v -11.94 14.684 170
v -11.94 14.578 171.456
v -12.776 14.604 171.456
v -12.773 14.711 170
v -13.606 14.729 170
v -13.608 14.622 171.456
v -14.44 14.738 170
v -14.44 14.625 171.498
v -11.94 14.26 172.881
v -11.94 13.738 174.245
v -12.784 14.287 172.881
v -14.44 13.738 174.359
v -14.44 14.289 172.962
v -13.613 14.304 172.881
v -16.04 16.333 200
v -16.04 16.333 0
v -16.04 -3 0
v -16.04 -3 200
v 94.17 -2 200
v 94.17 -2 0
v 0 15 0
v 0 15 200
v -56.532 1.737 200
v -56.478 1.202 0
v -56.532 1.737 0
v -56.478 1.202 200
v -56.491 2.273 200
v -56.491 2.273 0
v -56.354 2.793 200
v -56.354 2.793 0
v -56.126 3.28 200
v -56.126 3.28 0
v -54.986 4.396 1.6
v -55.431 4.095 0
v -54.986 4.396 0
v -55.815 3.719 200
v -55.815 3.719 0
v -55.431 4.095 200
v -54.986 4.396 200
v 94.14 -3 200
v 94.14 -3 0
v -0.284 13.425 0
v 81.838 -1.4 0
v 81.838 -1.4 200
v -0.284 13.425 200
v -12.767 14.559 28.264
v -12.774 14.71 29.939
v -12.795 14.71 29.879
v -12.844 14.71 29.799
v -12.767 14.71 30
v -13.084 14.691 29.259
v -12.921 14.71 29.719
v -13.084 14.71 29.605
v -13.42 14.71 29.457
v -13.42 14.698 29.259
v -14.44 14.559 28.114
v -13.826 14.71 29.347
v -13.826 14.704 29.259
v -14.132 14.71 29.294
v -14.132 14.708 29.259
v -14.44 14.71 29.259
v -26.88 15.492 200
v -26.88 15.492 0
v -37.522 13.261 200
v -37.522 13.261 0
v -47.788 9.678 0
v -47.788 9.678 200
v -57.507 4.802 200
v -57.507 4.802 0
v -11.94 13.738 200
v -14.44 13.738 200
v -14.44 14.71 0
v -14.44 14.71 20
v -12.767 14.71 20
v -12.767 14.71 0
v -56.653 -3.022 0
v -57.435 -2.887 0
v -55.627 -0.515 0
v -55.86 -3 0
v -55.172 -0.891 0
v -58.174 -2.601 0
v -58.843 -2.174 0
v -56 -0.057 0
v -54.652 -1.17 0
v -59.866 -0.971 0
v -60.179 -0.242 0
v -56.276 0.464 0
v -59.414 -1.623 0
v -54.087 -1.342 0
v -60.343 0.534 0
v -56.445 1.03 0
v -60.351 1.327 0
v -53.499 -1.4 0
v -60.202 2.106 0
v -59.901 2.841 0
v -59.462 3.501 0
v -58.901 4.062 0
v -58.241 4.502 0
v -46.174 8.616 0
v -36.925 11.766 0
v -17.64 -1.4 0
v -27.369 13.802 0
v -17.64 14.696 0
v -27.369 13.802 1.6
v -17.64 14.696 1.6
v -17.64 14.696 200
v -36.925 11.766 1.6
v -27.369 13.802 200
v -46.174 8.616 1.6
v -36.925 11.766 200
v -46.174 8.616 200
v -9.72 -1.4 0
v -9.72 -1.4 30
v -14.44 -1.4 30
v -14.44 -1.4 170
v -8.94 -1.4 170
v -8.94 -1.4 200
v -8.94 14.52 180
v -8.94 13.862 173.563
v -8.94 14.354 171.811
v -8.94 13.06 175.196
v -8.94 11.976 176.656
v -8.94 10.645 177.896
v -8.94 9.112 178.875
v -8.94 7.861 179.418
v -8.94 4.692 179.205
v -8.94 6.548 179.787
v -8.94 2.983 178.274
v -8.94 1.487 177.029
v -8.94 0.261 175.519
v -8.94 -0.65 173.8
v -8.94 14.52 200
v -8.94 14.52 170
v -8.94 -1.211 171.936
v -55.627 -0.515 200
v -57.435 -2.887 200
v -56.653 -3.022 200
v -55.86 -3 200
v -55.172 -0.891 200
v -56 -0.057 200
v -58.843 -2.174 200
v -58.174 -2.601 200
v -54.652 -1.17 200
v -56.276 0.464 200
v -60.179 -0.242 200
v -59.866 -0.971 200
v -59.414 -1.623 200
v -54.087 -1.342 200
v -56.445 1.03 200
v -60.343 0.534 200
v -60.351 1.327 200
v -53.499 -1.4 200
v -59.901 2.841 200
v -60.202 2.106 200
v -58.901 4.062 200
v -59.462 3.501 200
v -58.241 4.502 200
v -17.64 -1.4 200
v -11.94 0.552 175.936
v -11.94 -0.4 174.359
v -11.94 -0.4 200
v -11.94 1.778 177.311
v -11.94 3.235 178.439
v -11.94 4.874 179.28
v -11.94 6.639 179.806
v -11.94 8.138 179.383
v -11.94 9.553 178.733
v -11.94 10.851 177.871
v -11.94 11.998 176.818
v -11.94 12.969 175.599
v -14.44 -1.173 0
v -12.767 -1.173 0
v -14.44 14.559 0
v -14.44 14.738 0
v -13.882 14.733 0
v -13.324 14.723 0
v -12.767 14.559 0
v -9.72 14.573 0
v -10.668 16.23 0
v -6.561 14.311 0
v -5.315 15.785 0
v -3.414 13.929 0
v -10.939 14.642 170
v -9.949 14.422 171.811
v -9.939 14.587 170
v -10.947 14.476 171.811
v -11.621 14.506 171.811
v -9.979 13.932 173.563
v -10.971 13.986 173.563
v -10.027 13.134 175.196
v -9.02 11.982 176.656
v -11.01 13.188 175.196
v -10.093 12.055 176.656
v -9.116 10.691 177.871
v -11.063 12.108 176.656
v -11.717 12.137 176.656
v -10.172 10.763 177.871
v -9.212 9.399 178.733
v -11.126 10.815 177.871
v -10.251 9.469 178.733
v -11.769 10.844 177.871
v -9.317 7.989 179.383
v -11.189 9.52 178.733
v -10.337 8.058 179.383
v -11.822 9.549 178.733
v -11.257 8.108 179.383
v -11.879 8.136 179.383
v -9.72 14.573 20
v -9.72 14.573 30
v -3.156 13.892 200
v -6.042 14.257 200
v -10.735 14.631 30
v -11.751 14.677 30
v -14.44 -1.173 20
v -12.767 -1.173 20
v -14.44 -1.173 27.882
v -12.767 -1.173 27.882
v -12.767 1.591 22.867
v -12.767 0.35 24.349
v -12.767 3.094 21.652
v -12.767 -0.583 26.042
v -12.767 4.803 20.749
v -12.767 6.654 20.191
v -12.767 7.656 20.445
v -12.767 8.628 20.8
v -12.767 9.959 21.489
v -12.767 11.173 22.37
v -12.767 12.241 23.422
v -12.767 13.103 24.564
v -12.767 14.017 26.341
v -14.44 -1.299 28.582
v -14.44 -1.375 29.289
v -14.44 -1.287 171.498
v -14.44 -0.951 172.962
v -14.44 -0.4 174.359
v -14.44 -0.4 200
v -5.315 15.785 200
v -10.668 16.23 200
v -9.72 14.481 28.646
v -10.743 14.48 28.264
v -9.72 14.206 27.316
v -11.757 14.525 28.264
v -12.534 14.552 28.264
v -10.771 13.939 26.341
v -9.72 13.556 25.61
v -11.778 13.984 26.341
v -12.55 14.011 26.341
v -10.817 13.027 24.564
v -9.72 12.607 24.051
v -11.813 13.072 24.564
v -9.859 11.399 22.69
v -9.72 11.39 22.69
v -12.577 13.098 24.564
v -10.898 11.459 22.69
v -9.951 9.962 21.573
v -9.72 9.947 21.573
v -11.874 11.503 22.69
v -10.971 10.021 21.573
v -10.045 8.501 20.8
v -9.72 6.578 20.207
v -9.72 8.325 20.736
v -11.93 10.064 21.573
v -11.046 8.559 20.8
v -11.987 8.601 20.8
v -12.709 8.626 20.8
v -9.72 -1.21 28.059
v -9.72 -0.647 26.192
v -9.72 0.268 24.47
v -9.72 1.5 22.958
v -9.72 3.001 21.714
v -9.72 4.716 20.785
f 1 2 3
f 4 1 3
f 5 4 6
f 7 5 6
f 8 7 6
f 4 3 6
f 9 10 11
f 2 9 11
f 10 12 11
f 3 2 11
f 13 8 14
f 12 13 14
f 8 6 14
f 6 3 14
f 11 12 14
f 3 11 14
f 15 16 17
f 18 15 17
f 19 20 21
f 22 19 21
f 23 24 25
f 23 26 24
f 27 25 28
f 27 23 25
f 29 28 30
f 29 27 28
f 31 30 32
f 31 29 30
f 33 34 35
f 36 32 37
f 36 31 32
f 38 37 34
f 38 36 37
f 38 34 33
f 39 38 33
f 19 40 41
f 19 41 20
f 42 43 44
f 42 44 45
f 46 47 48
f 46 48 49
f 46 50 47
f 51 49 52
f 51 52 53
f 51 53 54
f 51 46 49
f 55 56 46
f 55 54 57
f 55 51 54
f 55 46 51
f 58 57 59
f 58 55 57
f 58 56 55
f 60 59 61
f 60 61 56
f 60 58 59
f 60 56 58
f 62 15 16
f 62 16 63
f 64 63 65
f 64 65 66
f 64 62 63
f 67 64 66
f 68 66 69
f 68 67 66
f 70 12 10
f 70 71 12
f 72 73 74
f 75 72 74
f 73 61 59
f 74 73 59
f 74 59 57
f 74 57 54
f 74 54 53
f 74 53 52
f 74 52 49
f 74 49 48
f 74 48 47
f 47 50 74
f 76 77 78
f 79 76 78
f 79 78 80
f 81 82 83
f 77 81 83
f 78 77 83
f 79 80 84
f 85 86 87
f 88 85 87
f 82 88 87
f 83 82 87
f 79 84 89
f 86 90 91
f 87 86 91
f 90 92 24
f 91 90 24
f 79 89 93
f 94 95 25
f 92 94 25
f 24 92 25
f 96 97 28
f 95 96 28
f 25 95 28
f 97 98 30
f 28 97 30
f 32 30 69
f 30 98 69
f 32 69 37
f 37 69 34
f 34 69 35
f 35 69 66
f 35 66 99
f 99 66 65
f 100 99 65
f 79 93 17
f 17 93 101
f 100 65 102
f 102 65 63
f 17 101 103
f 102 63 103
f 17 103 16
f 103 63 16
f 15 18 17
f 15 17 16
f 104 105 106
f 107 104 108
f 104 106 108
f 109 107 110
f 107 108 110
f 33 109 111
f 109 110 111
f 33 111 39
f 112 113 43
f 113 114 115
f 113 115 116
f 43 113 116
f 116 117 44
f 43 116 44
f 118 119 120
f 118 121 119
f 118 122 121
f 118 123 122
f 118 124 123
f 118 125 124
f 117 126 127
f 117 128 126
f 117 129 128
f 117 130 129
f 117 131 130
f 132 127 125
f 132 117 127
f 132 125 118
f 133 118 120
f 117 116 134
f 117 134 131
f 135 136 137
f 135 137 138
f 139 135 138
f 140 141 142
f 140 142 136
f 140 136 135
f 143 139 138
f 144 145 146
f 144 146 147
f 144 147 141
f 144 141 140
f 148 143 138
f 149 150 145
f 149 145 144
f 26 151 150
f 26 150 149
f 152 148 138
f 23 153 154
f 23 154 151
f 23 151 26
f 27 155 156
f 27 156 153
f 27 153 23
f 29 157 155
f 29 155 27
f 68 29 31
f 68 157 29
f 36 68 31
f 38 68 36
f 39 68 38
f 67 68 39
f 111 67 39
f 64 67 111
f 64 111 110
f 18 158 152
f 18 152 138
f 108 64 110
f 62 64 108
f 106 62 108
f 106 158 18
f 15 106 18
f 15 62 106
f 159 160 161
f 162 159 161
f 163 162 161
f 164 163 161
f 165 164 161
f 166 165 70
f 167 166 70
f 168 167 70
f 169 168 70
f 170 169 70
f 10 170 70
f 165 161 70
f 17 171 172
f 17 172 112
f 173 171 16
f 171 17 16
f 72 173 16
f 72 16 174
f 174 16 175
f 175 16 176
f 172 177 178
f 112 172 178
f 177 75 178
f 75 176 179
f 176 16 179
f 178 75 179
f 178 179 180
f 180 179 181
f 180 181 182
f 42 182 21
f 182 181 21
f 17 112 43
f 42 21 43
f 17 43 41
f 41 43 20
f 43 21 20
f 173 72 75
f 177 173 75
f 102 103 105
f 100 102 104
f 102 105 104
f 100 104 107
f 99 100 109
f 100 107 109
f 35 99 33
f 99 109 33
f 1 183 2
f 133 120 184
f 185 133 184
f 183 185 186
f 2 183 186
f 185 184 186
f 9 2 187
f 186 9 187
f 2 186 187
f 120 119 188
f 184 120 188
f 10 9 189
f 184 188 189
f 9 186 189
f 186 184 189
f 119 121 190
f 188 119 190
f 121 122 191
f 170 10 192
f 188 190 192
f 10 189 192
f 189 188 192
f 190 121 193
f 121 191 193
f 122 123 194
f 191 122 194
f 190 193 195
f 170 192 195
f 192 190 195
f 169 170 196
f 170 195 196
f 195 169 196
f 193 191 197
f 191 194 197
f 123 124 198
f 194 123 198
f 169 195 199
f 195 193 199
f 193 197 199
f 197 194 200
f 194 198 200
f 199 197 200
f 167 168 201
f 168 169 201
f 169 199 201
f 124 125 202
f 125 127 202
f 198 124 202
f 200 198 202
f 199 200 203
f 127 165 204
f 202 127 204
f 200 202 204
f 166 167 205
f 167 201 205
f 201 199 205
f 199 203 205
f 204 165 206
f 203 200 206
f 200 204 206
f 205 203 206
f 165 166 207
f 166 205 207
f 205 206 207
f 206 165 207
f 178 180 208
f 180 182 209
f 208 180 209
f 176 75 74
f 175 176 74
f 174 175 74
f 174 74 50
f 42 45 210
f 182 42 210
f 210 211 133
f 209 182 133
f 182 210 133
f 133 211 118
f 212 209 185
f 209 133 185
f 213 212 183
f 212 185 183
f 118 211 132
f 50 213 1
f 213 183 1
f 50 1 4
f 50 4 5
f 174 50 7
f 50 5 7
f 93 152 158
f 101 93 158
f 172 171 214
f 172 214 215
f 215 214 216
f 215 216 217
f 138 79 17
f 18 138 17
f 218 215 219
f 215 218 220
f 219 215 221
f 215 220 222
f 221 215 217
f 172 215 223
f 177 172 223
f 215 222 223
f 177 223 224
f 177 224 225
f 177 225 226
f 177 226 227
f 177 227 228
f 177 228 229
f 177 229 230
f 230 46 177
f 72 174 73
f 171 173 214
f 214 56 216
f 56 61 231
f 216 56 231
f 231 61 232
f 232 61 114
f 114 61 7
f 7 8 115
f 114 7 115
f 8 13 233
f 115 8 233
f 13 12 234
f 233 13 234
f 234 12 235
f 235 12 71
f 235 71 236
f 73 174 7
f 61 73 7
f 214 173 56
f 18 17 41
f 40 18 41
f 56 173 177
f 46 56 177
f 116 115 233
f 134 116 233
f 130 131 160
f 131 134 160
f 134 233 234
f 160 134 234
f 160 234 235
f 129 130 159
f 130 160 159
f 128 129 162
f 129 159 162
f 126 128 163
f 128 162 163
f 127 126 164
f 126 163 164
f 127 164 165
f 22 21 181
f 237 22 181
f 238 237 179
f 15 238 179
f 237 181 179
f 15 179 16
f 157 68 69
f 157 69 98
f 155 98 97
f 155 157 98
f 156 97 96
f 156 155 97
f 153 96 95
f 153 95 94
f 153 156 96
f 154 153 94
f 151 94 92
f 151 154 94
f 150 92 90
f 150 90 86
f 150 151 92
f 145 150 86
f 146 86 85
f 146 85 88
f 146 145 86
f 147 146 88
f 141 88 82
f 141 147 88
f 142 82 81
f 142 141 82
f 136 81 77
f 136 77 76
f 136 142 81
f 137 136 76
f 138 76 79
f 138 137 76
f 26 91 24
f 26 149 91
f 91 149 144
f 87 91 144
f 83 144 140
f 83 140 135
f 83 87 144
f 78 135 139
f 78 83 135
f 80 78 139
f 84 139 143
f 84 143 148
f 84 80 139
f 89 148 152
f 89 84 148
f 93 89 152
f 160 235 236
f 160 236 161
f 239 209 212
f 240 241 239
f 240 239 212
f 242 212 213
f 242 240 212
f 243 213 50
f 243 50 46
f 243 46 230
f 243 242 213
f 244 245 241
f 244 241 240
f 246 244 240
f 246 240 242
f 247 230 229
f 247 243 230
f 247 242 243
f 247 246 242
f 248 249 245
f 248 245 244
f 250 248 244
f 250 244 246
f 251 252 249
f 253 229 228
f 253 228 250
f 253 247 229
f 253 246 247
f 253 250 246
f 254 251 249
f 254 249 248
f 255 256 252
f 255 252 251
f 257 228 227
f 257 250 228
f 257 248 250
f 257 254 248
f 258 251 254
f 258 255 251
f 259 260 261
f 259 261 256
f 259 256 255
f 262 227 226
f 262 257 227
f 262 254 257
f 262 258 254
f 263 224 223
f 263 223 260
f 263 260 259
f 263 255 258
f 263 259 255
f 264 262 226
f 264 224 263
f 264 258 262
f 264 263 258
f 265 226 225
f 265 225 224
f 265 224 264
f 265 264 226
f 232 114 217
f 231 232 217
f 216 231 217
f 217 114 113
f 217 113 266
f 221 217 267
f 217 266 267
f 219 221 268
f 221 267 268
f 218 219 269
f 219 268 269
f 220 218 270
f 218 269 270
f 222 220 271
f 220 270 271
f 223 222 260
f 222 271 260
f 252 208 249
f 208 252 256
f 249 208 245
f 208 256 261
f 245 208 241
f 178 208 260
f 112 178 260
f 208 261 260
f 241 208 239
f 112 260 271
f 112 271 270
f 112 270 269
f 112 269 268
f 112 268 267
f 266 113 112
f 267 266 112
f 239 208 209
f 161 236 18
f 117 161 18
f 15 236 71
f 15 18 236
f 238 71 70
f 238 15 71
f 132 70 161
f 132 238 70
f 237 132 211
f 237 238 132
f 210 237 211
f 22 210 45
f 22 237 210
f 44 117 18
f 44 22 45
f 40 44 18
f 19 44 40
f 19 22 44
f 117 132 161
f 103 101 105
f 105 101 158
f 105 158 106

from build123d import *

# Parameters (mm, degrees)
F1_DEPTH      = 200
F3_DEPTH      = 200
F4_T          = -1.6
F4_2_T        = -1.6
F5_DEPTH      = 1.6
F6_W          = 2.5
F6_H          = 1
F7_DEPTH      = 20
F8_T4_ANGLE   = 38.4955577252
F8_T11_ANGLE  = 38.4955577252
F8_T18_ANGLE  = 38.4955577252
F8_T25_DEPTH  = 5.5
F8_T31_DEPTH  = 5.5
F8_T37_DEPTH  = 5.5
F9_W          = 1.672731913
F9_H          = 0.2267822191
F9_H_2        = 0.1519754522
F10_DEPTH     = 20
F11_T4_ANGLE  = 36.7926896337
F11_T10_ANGLE = 36.7926896337
F11_T18_DEPTH = 29.7195290041
F11_T23_DEPTH = 4.7195290041
F13_DEPTH     = 200
F14_R         = 3


# Not quite as in the source:
# - a fillet or chamfer that OpenCascade refuses, or shapes differently, is made with other operations: its cross-section is extruded or revolved along the edge and cut away or added


with BuildPart() as f1:
    # F0 (on Top) → F1 (new body)
    with BuildSketch(Plane.XY):
        with BuildLine():
            Line((94.1401966023, -3), (94.1696608117, -2.0004341641))
            Line((94.1696608117, -2.0004341641), (0, 15))
            ThreePointArc((0, 15), (-7.9879059152, 16.0504323354), (-16.0396361483, 16.3327251865))
            Line((-16.0396361483, 16.3327251865), (-16.0396361483, -3))
            Line((-16.0396361483, -3), (94.1401966023, -3))
        make_face()
    extrude(amount=F1_DEPTH)

    # F4
    f4_openings = [f1.faces().sort_by_distance(p)[0] for p in [
        (22.614044, 3.891358, 200),
    ]]
    offset(amount=F4_T, openings=f4_openings)


with BuildPart() as f3:
    # F2 (on face) → F3 (new body)
    with BuildSketch(Plane.XY.offset(200)):
        with BuildLine():
            Line((-16.0396361483, -3), (-16.0396361483, 16.3327251865))
            ThreePointArc((-16.0396361483, 16.3327251865), (-37.5222437907, 13.2612199418), (-57.5066562048, 4.8019152395))
            ThreePointArc((-57.5066562048, 4.8019152395), (-60.2806962129, 0.1415930949), (-55.8598033977, -3))
            Line((-55.8598033977, -3), (-16.0396361483, -3))
        make_face()
    extrude(amount=-F3_DEPTH)

    # F4#2
    f4_2_openings = [f3.faces().sort_by_distance(p)[0] for p in [
        (-34.83961, 5.023506, 200),
    ]]
    offset(amount=F4_2_T, openings=f4_2_openings, kind=Kind.INTERSECTION)


with BuildPart() as f5_tool:
    # F4_face (on face) → F5 (new body, through all)
    with BuildSketch(Plane(origin=(-34.5686000718, 5.0952187138, 1.6), x_dir=(1, 0, 0), z_dir=(0, 0, 1))):
        with BuildLine():
            ThreePointArc((16.9289639236, 9.600978508), (-3.4092890923, 6.3732828215), (-22.3173938219, -1.7842983593))
            ThreePointArc((-22.3173938219, -1.7842983593), (-24.1546496637, -4.5833369872), (-21.4060437384, -6.4952187138))
            Line((-21.4060437384, -6.4952187138), (16.9289639236, -6.4952187138))
            Line((16.9289639236, -6.4952187138), (16.9289639236, 9.600978508))
        make_face()
        with BuildLine():
            Line((116.4062392425, -6.4952187138), (34.2843472293, 8.3302336301))
            ThreePointArc((34.2843472293, 8.3302336301), (27.2349408421, 9.2915509636), (20.1289639236, 9.6427680764))
            Line((20.1289639236, 9.6427680764), (20.1289639236, -6.4952187138))
            Line((20.1289639236, -6.4952187138), (116.4062392425, -6.4952187138))
        make_face()
    extrude(amount=-F5_DEPTH)


with BuildPart() as f1_1:
    add(f1.part)

    # F5: cut by f5_tool
    add(f5_tool.part, mode=Mode.SUBTRACT)

    # F6 (on face) → F7 (join)
    with BuildSketch(Plane.XY.offset(200)):
        Polygon((-11.9396361483, -0.4), (-11.9396361483, -1.4), (-8.9396361483, -1.4), (-8.9396361483, 14.7379867902), (-11.9396361483, 14.7379867902), (-11.9396361483, 13.7379867902), align=None)
        with Locations((-13.1896361483, -0.9)):
            Rectangle(F6_W, F6_H)
        with Locations((-13.1896361483, 14.2379867902)):
            Rectangle(F6_W, F6_H)
    extrude(amount=-F7_DEPTH)

    # F8: fillet of radius 10 on 2 edges, made by hand


with BuildPart() as f3_1:
    add(f3.part)

    # F5: cut by f5_tool
    add(f5_tool.part, mode=Mode.SUBTRACT)

    # F12 (on face) → F13 (join)
    with BuildSketch(Plane.XY.offset(200)):
        with BuildLine():
            Line((-55.9746438103, -1.4), (-56.8859938937, 3.3109203545))
            ThreePointArc((-56.8859938937, 3.3109203545), (-58.7232497355, 0.5118817266), (-55.9746438103, -1.4))
        make_face()
    extrude(amount=-F13_DEPTH)

    # F14
    f14_edges = [f3_1.edges().sort_by_distance(p)[0] for p in [
        (-56.885994, 3.31092, 100),
        (-55.974644, -1.4, 100),
    ]]
    fillet(f14_edges, radius=F14_R)


with BuildPart() as f8_tool2:
    # F8_s3 → F8_t4 (revolve)
    with BuildSketch(Plane(origin=(10.2125694644, -4.0266529318, 0), x_dir=(0, 0, 1), z_dir=(0.9302990198, -0.3668020363, 0))):
        with BuildLine():
            ThreePointArc((170, -13.982703924), (177.0710678119, -11.0537717359), (180, -3.982703924))
            Line((180, -3.982703924), (180, -13.982703924))
            Line((180, -13.982703924), (170, -13.982703924))
        make_face()
    revolve(axis=Axis((-14.9610707823, -67.8731164952, 180), (0, 0, 1)), revolution_arc=F8_T4_ANGLE)

    split(bisect_by=Plane.YZ.offset(-8.9396361483), keep=Keep.BOTTOM)

    split(bisect_by=Plane.YZ.offset(-11.9396361483), keep=Keep.TOP)

    split(bisect_by=Plane.XZ.offset(-13.7379867902), keep=Keep.TOP)


with BuildPart() as f1_2:
    add(f1_1.part)

    # F8_t1: union F8_tool2
    add(f8_tool2.part)


with BuildPart() as f8_tool9:
    # F8_s10 → F8_t11 (revolve)
    with BuildSketch(Plane(origin=(10.2125694644, -4.0266529318, 0), x_dir=(0, 0, 1), z_dir=(0.9302990198, -0.3668020363, 0))):
        with BuildLine():
            ThreePointArc((170, -13.982703924), (177.0710678119, -11.0537717359), (180, -3.982703924))
            Line((180, -3.982703924), (180, -13.982703924))
            Line((180, -13.982703924), (170, -13.982703924))
        make_face()
    revolve(axis=Axis((-14.9610707823, -67.8731164952, 180), (0, 0, 1)), revolution_arc=F8_T11_ANGLE)

    split(bisect_by=Plane.YZ.offset(-8.9396361483), keep=Keep.BOTTOM)

    split(bisect_by=Plane.YZ.offset(-11.9396361483), keep=Keep.TOP)

    split(bisect_by=Plane.XZ.offset(-13.7379867902), keep=Keep.BOTTOM)


with BuildPart() as f1_3:
    add(f1_2.part)

    # F8_t8: union F8_tool9
    add(f8_tool9.part)


with BuildPart() as f8_tool16:
    # F8_s17 → F8_t18 (revolve)
    with BuildSketch(Plane(origin=(10.2125694644, -4.0266529318, 0), x_dir=(0, 0, 1), z_dir=(0.9302990198, -0.3668020363, 0))):
        with BuildLine():
            ThreePointArc((170, -13.982703924), (177.0710678119, -11.0537717359), (180, -3.982703924))
            Line((180, -3.982703924), (180, -13.982703924))
            Line((180, -13.982703924), (170, -13.982703924))
        make_face()
    revolve(axis=Axis((-14.9610707823, -67.8731164952, 180), (0, 0, 1)), revolution_arc=F8_T18_ANGLE)

    split(bisect_by=Plane.YZ.offset(-14.4396361483), keep=Keep.TOP)

    split(bisect_by=Plane.YZ.offset(-11.9396361483), keep=Keep.BOTTOM)

    split(bisect_by=Plane.XZ.offset(-13.7379867902), keep=Keep.BOTTOM)


with BuildPart() as f1_4:
    add(f1_3.part)

    # F8_t15: union F8_tool16
    add(f8_tool16.part)


with BuildPart() as f8_tool23:
    # F8_s24 → F8_t25 (new body)
    with BuildSketch(Plane.YZ.offset(-14.4396361483)):
        with BuildLine():
            ThreePointArc((-1.4, 170), (1.5289321881, 177.0710678119), (8.6, 180))
            Line((8.6, 180), (-1.4, 180))
            Line((-1.4, 180), (-1.4, 170))
        make_face()
    extrude(amount=F8_T25_DEPTH)

    split(bisect_by=Plane.XZ.offset(0.4), keep=Keep.TOP)

    split(bisect_by=Plane.YZ.offset(-11.9396361483), keep=Keep.BOTTOM)


with BuildPart() as f1_5:
    add(f1_4.part)

    # F8_t22: union F8_tool23
    add(f8_tool23.part)


with BuildPart() as f8_tool29:
    # F8_s30 → F8_t31 (new body)
    with BuildSketch(Plane.YZ.offset(-14.4396361483)):
        with BuildLine():
            ThreePointArc((-1.4, 170), (1.5289321881, 177.0710678119), (8.6, 180))
            Line((8.6, 180), (-1.4, 180))
            Line((-1.4, 180), (-1.4, 170))
        make_face()
    extrude(amount=F8_T31_DEPTH)

    split(bisect_by=Plane.XZ.offset(0.4), keep=Keep.TOP)

    split(bisect_by=Plane.YZ.offset(-11.9396361483), keep=Keep.TOP)


with BuildPart() as f1_6:
    add(f1_5.part)

    # F8_t28: union F8_tool29
    add(f8_tool29.part)


with BuildPart() as f8_tool35:
    # F8_s36 → F8_t37 (new body)
    with BuildSketch(Plane.YZ.offset(-14.4396361483)):
        with BuildLine():
            ThreePointArc((-1.4, 170), (1.5289321881, 177.0710678119), (8.6, 180))
            Line((8.6, 180), (-1.4, 180))
            Line((-1.4, 180), (-1.4, 170))
        make_face()
    extrude(amount=F8_T37_DEPTH)

    split(bisect_by=Plane.XZ.offset(0.4), keep=Keep.BOTTOM)

    split(bisect_by=Plane.YZ.offset(-11.9396361483), keep=Keep.TOP)


with BuildPart() as f1_7:
    add(f1_6.part)

    # F8_t34: union F8_tool35
    add(f8_tool35.part)

    # F9 (on face) → F10 (join)
    with BuildSketch(Plane(origin=(0, 0, 0), x_dir=(1, 0, 0), z_dir=(0, 0, -1))):
        Polygon((-9.7201071442, -14.7104891011), (-9.7201071442, 1.4), (-12.7669042352, 1.4), (-12.7669042352, 1.1732177809), (-12.7669042352, -14.5585136488), (-12.7669042352, -14.7104891011), align=None)
        with Locations((-13.6032701918, 1.2866088904)):
            Rectangle(F9_W, F9_H)
        with Locations((-13.6032701918, -14.6345013749)):
            Rectangle(F9_W, F9_H_2)
    extrude(amount=-F10_DEPTH)

    # F11: fillet of radius 10 on 2 edges, made by hand


with BuildPart() as f11_tool2:
    # F11_s3 → F11_t4 (revolve)
    with BuildSketch(Plane(origin=(9.6429632601, -3.6969453305, 0), x_dir=(0, 0, 1), z_dir=(0.9337307092, -0.3579762042, 0))):
        with BuildLine():
            ThreePointArc((30, -13.8818283686), (22.9289321881, -10.9528961805), (20, -3.8818283686))
            Line((20, -3.8818283686), (20, -13.8818283686))
            Line((20, -13.8818283686), (30, -13.8818283686))
        make_face()
    revolve(axis=Axis((-14.9610707823, -67.8731164952, 20), (0, 0, 1)), revolution_arc=F11_T4_ANGLE)

    split(bisect_by=Plane.YZ.offset(-12.7669042352), keep=Keep.TOP)

    split(bisect_by=Plane.YZ.offset(-9.7201071442), keep=Keep.BOTTOM)


with BuildPart() as f1_8:
    add(f1_7.part)

    # F11_t1: union F11_tool2
    add(f11_tool2.part)


with BuildPart() as f11_tool8:
    # F11_s9 → F11_t10 (revolve)
    with BuildSketch(Plane(origin=(9.6429632601, -3.6969453305, 0), x_dir=(0, 0, 1), z_dir=(0.9337307092, -0.3579762042, 0))):
        with BuildLine():
            ThreePointArc((30, -13.8818283686), (22.9289321881, -10.9528961805), (20, -3.8818283686))
            Line((20, -3.8818283686), (20, -13.8818283686))
            Line((20, -13.8818283686), (30, -13.8818283686))
        make_face()
    revolve(axis=Axis((-14.9610707823, -67.8731164952, 20), (0, 0, 1)), revolution_arc=F11_T10_ANGLE)

    split(bisect_by=Plane.YZ.offset(-14.4396361483), keep=Keep.TOP)

    split(bisect_by=Plane.XZ.offset(-14.5585136488), keep=Keep.BOTTOM)

    split(bisect_by=Plane.XZ.offset(-14.7104891011), keep=Keep.TOP)

    split(bisect_by=Plane.YZ.offset(-9.7201071442), keep=Keep.BOTTOM)


with BuildPart() as f1_9:
    add(f1_8.part)

    # F11_t7: union F11_tool8
    add(f11_tool8.part)


with BuildPart() as f11_tool16:
    # F11_s17 → F11_t18 (new body)
    with BuildSketch(Plane.YZ.offset(-9.7201071442)):
        with BuildLine():
            ThreePointArc((-1.4, 30), (1.5289321881, 22.9289321881), (8.6, 20))
            Line((8.6, 20), (-1.4, 20))
            Line((-1.4, 20), (-1.4, 30))
        make_face()
    extrude(amount=-F11_T18_DEPTH)

    split(bisect_by=Plane.YZ.offset(-12.7669042352), keep=Keep.TOP)


with BuildPart() as f1_10:
    add(f1_9.part)

    # F11_t15: union F11_tool16
    add(f11_tool16.part)


with BuildPart() as f11_tool21:
    # F11_s22 → F11_t23 (new body)
    with BuildSketch(Plane.YZ.offset(-9.7201071442)):
        with BuildLine():
            ThreePointArc((-1.4, 30), (1.5289321881, 22.9289321881), (8.6, 20))
            Line((8.6, 20), (-1.4, 20))
            Line((-1.4, 20), (-1.4, 30))
        make_face()
    extrude(amount=-F11_T23_DEPTH)

    split(bisect_by=Plane.XZ.offset(1.1732177809), keep=Keep.TOP)


with BuildPart() as f1_11:
    add(f1_10.part)

    # F11_t20: union F11_tool21
    add(f11_tool21.part)


solid = Compound([f3_1.part, f1_11.part])
